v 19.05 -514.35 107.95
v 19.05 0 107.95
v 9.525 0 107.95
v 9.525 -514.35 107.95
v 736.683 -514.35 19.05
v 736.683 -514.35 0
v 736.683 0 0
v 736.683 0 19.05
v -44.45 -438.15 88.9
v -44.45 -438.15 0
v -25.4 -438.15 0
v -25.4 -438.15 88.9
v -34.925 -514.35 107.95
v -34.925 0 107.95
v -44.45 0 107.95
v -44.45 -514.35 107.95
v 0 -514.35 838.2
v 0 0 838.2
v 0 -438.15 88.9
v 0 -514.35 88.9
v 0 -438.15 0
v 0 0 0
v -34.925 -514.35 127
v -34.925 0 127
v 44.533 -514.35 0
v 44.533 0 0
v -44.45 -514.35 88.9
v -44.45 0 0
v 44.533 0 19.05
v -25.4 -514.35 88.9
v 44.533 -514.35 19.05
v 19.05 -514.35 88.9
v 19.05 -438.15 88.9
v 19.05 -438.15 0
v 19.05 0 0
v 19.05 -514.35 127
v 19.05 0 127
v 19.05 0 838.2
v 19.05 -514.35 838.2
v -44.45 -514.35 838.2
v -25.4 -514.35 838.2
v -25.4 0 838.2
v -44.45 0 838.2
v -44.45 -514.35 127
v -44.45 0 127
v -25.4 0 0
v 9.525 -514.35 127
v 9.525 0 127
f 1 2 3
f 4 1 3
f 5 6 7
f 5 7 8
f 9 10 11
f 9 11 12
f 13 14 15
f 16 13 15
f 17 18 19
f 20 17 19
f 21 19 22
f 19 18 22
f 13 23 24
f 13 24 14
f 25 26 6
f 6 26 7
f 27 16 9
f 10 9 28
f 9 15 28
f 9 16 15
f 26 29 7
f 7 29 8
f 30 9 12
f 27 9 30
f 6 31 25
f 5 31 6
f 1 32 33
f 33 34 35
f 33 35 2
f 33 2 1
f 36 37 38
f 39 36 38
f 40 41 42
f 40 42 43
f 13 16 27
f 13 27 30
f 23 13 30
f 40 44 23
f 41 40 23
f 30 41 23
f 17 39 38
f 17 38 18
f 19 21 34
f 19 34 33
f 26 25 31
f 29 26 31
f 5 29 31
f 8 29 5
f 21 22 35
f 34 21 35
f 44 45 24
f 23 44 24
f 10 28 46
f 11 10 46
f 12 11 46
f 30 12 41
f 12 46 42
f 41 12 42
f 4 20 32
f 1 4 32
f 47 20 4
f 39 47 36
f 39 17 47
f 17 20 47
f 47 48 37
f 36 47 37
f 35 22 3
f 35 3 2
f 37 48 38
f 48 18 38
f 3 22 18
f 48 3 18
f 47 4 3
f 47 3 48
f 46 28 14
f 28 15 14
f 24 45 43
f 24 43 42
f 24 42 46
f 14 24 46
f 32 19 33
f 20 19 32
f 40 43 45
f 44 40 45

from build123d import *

# Parameters (mm, degrees)
F1_DEPTH = 514.35
F2_W     = 692.15
F2_H     = 19.05
F3_DEPTH = 514.35
F4_W     = 76.2
F4_H     = 88.9
F5_DEPTH = 76.2


with BuildPart() as f1:
    # F0 (on Front) → F1 (new body)
    with BuildSketch(Plane.XZ):
        Polygon((0, 838.2), (0, 0), (19.05, 0), (19.05, 107.95), (9.525, 107.95), (9.525, 127), (19.05, 127), (19.05, 838.2), align=None)
        Polygon((-44.45, 0), (-25.4, 0), (-25.4, 838.2), (-44.45, 838.2), (-44.45, 127), (-34.925, 127), (-34.925, 107.95), (-44.45, 107.95), align=None)
    extrude(amount=F1_DEPTH)

    # F4 (on face) → F5 (cut)
    with BuildSketch(Plane(origin=(-44.45, 0, 0), x_dir=(0, -1, 0), z_dir=(-1, 0, 0))):
        with Locations((476.25, 44.45)):
            Rectangle(F4_W, F4_H)
    extrude(amount=-F5_DEPTH, mode=Mode.SUBTRACT)


with BuildPart() as f3:
    # F2 (on Front) → F3 (new body)
    with BuildSketch(Plane.XZ):
        with Locations((390.607703, 9.525)):
            Rectangle(F2_W, F2_H)
    extrude(amount=F3_DEPTH)


solid = Compound([f1.part, f3.part])
